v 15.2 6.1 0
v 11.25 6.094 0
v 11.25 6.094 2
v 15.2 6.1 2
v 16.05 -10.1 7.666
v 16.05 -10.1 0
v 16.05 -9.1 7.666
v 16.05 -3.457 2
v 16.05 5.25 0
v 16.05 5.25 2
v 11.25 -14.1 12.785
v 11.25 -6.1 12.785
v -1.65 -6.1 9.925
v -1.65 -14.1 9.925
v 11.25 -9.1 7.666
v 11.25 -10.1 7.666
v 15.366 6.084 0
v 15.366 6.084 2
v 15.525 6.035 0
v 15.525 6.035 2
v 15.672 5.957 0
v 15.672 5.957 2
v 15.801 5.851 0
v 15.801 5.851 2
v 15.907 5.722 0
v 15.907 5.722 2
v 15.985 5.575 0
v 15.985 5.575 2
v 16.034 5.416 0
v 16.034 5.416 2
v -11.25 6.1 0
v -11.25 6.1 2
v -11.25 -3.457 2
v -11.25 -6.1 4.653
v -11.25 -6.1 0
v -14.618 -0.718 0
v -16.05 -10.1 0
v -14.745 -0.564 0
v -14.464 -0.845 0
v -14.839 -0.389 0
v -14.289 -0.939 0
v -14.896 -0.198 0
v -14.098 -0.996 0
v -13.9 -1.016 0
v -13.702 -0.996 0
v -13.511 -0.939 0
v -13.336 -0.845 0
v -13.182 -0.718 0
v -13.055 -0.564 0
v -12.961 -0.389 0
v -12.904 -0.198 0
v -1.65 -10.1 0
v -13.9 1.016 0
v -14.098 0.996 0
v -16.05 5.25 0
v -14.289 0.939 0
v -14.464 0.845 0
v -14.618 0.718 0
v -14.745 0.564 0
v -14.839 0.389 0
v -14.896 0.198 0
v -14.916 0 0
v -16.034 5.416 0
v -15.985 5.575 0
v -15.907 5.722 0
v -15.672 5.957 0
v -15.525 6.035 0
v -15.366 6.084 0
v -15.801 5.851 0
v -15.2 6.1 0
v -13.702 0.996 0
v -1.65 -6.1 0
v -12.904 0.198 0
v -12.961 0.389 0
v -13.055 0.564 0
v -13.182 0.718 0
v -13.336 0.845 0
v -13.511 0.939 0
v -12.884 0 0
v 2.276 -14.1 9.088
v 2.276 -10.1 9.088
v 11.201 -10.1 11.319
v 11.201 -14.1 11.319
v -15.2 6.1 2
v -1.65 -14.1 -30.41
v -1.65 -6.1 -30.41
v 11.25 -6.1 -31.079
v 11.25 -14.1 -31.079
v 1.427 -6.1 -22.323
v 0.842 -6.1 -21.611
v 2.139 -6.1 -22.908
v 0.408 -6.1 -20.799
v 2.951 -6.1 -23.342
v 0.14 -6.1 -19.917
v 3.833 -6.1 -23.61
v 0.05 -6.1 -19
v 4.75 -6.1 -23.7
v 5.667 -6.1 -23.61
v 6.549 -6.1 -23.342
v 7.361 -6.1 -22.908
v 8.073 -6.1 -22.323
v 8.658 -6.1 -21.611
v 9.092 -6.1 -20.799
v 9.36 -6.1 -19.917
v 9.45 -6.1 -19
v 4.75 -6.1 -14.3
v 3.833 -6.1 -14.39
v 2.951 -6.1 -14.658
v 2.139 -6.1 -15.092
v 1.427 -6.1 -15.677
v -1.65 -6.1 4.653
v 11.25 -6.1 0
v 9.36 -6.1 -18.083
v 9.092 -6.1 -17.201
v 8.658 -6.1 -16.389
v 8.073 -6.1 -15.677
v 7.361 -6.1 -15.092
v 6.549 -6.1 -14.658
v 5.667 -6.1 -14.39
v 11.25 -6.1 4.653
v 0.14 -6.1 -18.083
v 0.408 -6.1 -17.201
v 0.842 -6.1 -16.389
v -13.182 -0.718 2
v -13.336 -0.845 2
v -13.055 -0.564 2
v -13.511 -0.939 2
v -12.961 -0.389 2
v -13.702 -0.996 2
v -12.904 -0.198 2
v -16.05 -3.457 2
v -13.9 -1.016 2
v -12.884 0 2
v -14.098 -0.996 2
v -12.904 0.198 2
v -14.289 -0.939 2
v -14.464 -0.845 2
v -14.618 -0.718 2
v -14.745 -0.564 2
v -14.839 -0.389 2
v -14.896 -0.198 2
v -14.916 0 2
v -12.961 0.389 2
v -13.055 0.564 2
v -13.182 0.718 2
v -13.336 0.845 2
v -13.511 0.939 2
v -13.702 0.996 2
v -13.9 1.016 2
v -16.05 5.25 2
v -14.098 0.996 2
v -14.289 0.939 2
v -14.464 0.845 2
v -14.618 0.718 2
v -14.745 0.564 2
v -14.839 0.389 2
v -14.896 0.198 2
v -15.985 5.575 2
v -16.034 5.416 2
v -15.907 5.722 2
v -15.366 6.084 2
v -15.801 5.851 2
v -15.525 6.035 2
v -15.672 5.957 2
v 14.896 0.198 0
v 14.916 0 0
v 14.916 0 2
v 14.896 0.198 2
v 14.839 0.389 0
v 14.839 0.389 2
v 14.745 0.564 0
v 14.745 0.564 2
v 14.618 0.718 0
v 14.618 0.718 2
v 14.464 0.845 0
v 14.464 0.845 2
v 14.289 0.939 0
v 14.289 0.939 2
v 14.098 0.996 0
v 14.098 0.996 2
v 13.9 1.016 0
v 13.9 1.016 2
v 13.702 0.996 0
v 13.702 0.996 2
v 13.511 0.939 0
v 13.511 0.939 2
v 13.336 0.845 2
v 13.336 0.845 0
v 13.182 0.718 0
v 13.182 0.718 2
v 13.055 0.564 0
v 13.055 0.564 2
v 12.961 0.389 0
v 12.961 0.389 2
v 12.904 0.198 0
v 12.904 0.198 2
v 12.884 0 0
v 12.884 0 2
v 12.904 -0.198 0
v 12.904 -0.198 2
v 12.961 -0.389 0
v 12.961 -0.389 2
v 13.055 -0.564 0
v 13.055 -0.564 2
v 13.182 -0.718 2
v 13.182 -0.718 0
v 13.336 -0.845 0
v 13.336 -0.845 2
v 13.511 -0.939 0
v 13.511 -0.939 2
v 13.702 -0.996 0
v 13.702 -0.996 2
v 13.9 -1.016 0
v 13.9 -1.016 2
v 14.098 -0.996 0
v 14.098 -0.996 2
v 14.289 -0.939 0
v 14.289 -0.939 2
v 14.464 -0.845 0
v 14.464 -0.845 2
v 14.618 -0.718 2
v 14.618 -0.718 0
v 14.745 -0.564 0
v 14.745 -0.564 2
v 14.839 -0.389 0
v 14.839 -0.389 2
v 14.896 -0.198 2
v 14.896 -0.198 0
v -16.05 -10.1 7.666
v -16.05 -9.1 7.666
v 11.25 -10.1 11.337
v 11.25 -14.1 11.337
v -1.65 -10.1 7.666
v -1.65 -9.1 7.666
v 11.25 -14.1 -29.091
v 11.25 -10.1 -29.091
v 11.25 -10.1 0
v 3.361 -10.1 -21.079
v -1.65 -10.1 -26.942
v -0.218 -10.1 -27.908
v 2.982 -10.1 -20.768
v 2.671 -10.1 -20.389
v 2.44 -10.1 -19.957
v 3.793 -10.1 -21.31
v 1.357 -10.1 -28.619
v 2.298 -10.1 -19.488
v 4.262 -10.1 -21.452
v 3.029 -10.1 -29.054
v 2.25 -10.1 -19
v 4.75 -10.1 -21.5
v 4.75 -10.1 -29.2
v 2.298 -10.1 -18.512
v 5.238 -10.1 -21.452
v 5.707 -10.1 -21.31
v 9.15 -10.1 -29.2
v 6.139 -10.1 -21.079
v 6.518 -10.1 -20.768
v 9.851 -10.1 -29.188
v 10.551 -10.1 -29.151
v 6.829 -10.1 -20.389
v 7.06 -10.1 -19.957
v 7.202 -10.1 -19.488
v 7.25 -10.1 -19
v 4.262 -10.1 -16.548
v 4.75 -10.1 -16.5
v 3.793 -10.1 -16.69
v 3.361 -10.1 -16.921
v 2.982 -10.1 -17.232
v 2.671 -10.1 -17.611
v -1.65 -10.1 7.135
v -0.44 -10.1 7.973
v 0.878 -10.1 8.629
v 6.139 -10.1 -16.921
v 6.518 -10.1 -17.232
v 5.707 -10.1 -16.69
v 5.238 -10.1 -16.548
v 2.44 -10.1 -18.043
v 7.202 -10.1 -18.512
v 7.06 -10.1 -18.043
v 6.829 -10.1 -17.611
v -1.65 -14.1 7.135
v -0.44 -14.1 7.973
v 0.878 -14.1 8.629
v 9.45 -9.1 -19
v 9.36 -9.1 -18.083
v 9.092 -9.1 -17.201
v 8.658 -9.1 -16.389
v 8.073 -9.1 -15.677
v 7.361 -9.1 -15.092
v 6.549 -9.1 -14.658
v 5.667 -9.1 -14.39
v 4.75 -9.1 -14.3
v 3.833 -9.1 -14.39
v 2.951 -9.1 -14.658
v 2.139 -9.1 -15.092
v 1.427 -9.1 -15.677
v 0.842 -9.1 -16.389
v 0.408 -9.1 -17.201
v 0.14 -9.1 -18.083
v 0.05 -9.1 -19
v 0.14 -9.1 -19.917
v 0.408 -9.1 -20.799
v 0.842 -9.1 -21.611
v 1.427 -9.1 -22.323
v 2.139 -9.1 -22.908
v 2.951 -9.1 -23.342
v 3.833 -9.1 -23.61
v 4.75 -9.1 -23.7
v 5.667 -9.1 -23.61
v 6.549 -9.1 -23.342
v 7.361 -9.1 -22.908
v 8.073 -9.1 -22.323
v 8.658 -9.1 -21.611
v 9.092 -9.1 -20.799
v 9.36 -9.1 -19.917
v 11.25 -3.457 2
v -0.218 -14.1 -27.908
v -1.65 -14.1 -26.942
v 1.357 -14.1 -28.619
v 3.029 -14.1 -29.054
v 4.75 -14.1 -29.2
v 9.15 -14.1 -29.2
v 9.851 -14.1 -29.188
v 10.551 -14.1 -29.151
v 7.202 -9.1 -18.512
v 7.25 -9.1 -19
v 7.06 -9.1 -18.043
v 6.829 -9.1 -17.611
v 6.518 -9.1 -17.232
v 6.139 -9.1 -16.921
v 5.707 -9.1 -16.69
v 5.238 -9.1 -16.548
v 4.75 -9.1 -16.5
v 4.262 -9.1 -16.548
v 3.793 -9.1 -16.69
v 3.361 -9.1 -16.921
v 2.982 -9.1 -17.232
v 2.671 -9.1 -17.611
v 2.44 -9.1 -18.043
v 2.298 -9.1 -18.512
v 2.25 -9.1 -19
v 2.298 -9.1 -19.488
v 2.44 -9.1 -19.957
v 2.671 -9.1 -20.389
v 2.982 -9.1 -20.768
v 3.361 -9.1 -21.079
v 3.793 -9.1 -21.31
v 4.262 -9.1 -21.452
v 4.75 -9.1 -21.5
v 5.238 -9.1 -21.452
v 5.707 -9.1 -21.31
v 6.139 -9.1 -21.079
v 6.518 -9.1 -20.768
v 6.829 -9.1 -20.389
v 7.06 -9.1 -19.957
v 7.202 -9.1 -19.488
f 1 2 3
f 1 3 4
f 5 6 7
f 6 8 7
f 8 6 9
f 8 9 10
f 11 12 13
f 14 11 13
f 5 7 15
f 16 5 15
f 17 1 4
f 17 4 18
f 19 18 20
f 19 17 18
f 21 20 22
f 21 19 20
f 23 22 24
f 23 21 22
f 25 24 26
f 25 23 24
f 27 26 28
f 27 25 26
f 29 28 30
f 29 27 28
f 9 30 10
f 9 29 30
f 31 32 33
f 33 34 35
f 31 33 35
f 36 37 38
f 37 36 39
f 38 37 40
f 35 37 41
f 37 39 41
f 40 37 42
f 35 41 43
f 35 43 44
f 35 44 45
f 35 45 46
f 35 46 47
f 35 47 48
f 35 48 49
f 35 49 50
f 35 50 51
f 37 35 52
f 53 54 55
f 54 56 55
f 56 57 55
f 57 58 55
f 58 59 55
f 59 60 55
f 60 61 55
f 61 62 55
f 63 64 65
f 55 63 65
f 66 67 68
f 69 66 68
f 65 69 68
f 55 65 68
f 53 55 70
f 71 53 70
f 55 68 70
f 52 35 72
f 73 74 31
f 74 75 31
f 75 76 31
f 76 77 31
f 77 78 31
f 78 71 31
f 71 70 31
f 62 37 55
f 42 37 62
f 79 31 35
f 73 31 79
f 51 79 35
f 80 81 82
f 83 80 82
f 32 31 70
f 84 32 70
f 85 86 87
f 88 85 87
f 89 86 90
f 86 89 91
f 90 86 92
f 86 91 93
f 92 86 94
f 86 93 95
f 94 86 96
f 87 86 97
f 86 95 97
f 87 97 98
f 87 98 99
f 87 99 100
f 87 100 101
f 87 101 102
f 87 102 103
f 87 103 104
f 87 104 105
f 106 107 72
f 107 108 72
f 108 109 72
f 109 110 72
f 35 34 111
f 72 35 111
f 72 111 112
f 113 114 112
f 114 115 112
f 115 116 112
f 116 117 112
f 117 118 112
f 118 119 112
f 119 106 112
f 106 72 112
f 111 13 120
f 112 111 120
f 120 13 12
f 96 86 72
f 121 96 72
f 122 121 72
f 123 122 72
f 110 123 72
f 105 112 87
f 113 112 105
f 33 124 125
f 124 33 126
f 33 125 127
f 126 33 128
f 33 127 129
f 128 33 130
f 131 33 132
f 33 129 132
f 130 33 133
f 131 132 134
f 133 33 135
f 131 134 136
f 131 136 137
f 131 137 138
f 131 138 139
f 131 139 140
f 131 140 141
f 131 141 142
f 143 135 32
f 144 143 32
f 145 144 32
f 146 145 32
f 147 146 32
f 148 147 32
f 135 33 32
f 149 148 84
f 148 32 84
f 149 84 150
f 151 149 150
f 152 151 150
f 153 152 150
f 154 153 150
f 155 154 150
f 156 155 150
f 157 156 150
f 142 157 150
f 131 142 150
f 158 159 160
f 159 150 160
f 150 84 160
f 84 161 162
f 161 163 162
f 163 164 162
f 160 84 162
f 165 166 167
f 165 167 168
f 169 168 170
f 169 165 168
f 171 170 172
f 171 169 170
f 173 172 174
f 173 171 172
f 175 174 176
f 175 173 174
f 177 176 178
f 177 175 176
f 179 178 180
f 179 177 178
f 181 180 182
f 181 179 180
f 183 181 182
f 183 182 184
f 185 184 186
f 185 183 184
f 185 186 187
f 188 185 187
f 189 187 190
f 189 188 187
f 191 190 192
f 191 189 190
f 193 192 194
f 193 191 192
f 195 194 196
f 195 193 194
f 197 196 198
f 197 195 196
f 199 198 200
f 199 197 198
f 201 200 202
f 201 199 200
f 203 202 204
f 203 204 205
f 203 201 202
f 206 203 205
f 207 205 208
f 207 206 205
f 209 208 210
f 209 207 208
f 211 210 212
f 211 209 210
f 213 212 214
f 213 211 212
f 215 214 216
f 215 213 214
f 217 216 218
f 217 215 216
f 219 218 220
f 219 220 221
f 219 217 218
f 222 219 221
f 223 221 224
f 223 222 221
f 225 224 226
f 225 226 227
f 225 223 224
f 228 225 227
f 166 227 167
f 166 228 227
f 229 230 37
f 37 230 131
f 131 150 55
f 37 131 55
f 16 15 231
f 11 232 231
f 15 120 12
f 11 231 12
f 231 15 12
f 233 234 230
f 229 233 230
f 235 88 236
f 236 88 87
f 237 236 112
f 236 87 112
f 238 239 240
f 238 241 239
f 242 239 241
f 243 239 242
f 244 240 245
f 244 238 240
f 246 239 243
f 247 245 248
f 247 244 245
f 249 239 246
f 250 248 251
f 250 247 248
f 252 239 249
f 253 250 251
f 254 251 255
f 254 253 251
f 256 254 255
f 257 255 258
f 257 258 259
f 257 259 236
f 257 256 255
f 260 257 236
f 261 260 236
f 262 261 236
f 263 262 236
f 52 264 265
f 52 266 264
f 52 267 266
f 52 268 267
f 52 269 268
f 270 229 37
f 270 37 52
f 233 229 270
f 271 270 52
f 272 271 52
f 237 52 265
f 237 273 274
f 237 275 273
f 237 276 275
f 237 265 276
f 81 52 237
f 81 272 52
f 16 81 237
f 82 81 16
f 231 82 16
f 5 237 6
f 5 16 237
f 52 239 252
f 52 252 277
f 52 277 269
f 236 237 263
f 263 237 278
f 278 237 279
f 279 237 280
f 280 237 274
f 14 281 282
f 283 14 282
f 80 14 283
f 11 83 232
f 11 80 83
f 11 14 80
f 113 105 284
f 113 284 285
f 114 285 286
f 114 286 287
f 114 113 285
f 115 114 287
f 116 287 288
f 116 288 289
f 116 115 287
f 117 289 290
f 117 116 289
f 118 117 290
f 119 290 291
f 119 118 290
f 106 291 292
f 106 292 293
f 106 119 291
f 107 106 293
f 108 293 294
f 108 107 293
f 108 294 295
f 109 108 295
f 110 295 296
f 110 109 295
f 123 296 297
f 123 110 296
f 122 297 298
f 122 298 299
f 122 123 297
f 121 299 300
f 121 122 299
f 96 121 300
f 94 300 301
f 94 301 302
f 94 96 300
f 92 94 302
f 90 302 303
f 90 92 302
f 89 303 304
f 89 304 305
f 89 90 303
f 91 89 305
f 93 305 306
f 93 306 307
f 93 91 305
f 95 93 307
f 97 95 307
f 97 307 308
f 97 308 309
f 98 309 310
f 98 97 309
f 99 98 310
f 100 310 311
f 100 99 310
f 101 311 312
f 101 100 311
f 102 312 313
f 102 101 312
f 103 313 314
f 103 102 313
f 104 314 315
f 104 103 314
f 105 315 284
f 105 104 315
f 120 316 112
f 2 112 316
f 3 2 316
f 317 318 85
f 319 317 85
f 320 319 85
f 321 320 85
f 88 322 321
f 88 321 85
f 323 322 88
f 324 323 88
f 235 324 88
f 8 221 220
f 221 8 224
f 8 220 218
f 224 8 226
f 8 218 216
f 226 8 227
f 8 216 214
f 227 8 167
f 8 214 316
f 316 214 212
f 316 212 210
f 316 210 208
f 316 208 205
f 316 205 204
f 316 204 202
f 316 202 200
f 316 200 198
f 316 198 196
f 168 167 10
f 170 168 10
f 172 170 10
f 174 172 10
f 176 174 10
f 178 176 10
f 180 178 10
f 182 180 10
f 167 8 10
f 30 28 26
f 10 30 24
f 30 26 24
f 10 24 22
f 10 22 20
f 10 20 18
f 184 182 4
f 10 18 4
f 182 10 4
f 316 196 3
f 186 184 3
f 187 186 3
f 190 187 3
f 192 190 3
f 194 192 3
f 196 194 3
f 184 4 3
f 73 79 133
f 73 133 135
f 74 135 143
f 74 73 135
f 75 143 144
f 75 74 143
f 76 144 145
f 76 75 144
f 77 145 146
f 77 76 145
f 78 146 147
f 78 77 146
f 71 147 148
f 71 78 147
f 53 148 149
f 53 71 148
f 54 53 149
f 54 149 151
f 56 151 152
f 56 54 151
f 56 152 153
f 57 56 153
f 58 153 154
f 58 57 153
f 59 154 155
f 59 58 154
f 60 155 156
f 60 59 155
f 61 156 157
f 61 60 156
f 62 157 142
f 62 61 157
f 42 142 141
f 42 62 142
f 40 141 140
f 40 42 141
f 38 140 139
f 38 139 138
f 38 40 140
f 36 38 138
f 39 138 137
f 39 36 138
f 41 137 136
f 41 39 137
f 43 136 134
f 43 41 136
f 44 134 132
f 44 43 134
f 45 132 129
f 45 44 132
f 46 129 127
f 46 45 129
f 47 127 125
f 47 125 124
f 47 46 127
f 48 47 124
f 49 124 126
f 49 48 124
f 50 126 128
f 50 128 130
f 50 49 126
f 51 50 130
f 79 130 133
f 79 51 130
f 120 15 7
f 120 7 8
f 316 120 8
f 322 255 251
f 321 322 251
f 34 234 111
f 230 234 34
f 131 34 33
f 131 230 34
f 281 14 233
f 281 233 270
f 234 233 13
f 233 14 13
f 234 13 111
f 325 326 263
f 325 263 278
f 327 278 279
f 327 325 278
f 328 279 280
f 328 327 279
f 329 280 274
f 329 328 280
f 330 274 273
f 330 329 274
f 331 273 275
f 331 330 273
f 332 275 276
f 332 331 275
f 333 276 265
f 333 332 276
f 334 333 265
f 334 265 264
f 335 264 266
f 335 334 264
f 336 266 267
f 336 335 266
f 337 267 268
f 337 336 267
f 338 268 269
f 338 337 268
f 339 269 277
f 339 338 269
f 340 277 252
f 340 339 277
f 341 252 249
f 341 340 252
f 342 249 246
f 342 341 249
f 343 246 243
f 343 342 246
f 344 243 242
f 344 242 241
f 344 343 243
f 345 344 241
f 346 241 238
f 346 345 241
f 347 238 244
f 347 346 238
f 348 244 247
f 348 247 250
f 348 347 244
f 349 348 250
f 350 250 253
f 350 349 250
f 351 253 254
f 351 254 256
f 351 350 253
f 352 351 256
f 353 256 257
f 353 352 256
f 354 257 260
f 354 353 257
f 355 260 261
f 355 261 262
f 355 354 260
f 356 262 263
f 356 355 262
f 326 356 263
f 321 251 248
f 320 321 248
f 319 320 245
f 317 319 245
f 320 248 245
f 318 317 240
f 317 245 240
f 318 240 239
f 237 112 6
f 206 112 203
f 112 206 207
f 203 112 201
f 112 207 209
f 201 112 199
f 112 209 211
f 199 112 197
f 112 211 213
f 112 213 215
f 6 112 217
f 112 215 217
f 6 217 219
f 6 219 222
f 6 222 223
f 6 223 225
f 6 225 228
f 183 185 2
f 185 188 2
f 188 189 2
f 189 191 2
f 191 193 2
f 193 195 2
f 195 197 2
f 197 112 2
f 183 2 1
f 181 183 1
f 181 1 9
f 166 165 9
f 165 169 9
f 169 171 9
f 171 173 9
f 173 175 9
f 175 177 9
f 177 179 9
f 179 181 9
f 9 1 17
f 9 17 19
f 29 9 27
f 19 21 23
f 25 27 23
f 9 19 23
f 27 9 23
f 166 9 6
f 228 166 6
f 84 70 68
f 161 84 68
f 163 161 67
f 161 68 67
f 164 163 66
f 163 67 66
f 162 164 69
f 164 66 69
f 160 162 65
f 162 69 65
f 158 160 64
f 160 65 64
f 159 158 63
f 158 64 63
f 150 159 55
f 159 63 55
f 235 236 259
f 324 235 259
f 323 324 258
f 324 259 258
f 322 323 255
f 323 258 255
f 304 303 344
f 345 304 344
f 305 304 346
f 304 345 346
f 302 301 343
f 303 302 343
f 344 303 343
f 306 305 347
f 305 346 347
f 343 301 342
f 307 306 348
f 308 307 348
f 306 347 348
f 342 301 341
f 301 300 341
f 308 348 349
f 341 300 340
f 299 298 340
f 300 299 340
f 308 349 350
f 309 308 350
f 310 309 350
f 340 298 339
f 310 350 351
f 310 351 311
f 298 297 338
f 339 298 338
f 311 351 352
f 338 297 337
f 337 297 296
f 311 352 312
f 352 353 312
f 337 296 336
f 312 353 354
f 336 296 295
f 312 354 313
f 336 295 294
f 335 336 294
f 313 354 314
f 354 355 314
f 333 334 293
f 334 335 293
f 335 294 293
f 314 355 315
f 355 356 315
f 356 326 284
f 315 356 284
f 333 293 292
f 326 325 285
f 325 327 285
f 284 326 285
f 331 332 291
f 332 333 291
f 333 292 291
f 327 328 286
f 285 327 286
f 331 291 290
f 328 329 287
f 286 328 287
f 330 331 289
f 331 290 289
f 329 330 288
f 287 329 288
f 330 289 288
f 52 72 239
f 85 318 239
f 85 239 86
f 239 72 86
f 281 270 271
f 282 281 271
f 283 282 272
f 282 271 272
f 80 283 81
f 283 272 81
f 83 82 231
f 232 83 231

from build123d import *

# Parameters (mm, degrees)
SKETCH1_R                       = 1.016
BOSS_EXTRUDE1_DEPTH             = 2
SKETCH2_R                       = 4.7
BOSS_EXTRUDE2_DEPTH             = 3
BOSS_EXTRUDE5_DEPTH             = 8
BOSS_EXTRUDE6_REACH             = 45.704
BOSS_EXTRUDE6_DIRECTION_2_REACH = 45.704
SKETCH4_W                       = 22.5
SKETCH4_H                       = 14.127681706
CUT_EXTRUDE1_DEPTH              = 7
SKETCH5_R                       = 2.5
BOSS_EXTRUDE7_DEPTH             = 1


with BuildPart() as part:
    # Sketch1 → Boss-Extrude1 (new body)
    # profile 1 of 4: a face of its own
    with BuildSketch(Plane.XY):
        with BuildLine():
            Line((-16.05, 5.25), (-16.05, -5.25))
            ThreePointArc((-16.05, -5.25), (-15.801040764, -5.851040764), (-15.2, -6.1))
            Line((-15.2, -6.1), (-11.25, -6.1))
            Line((-11.25, -6.1), (-11.25, 6.1))
            Line((-11.25, 6.1), (-15.2, 6.1))
            ThreePointArc((-15.2, 6.1), (-15.801040764, 5.851040764), (-16.05, 5.25))
        make_face()
        with Locations((-13.9, 0)):
            Circle(SKETCH1_R, mode=Mode.SUBTRACT)
    # profile 2 of 4: a face of its own
    with BuildSketch(Plane.XY):
        with BuildLine():
            Line((16.05, 5.25), (16.05, -5.25))
            ThreePointArc((16.05, -5.25), (15.801040764, -5.851040764), (15.2, -6.1))
            Line((15.2, -6.1), (11.25, -6.1))
            Line((11.25, -6.1), (11.25, 6.094097151))
            Line((11.25, 6.094097151), (15.2, 6.1))
            ThreePointArc((15.2, 6.1), (15.801040764, 5.851040764), (16.05, 5.25))
        make_face()
        with Locations((13.9, 0)):
            Circle(SKETCH1_R, mode=Mode.SUBTRACT)
    # profile 3 of 4: a face of its own
    with BuildSketch(Plane.XY):
        with BuildLine():
            ThreePointArc((15.2, -6.1), (15.801040764, -5.851040764), (16.05, -5.25))
            Line((16.05, -5.25), (16.05, -6.1))
            Line((16.05, -6.1), (15.2, -6.1))
        make_face()
    # profile 4 of 4: a face of its own
    with BuildSketch(Plane.XY):
        with BuildLine():
            ThreePointArc((-16.05, -5.25), (-15.801040764, -5.851040764), (-15.2, -6.1))
            Line((-15.2, -6.1), (-16.05, -6.1))
            Line((-16.05, -6.1), (-16.05, -5.25))
        make_face()
    extrude(amount=BOSS_EXTRUDE1_DEPTH)

    # Sketch2 → Boss-Extrude2 (add)
    with BuildSketch(Plane.XZ.offset(6.1)):
        Polygon((16.05, 2), (11.25, 2), (11.25, 12.784507897), (-1.65, 9.925449639), (-1.65, 2), (-16.05, 2), (-16.05, 0), (-1.65, 0), (-1.65, -30.41033757), (11.25, -31.079190458), (11.25, 0), (16.05, 0), align=None)
        with Locations((4.75, -19)):
            Circle(SKETCH2_R, mode=Mode.SUBTRACT)
    extrude(amount=BOSS_EXTRUDE2_DEPTH)

    # Sketch2<3> → Boss-Extrude5 (add)
    with BuildSketch(Plane.XZ.offset(6.1)):
        with BuildLine():
            Line((11.201492875, 11.3190285), (11.25, 11.337476622))
            Line((11.25, 11.337476622), (11.25, 12.784507897))
            Line((11.25, 12.784507897), (-1.65, 9.925449639))
            Line((-1.65, 9.925449639), (-1.65, 7.134527797))
            ThreePointArc((-1.65, 7.134527797), (0.2068653, 8.32459199), (2.276136625, 9.087689437))
            Line((2.276136625, 9.087689437), (11.201492875, 11.3190285))
        make_face()
        with BuildLine():
            ThreePointArc((4.75, -29.2), (1.356725547, -28.619027419), (-1.65, -26.942291861))
            Line((-1.65, -26.942291861), (-1.65, -30.41033757))
            Line((-1.65, -30.41033757), (11.25, -31.079190458))
            Line((11.25, -31.079190458), (11.25, -29.090542554))
            ThreePointArc((11.25, -29.090542554), (10.201413429, -29.172617079), (9.149976222, -29.2))
            Line((9.149976222, -29.2), (4.75, -29.2))
        make_face()
    extrude(amount=BOSS_EXTRUDE5_DEPTH)

    # Boss-Extrude6: up to this face of the body (flat: up to its plane)
    boss_extrude6_end = Plane(part.part.faces().sort_by_distance((16.05, -1.925, 1))[0])
    # Sketch3 → Boss-Extrude6 (add, up to the picked face)
    with BuildSketch(Plane(origin=(11.25, 0, 0), x_dir=(0, 0, -1), z_dir=(1, 0, 0)), mode=Mode.PRIVATE) as boss_extrude6_sk1:
        Polygon((-7.665828596, -9.1), (-2, -3.457464127), (-2, -9.1), align=None)
    boss_extrude6_tool1 = split(extrude(boss_extrude6_sk1.sketch, amount=BOSS_EXTRUDE6_REACH, mode=Mode.PRIVATE), bisect_by=boss_extrude6_end, keep=Keep.BOTH, mode=Mode.PRIVATE)
    add(boss_extrude6_tool1.solids().sort_by(Axis((11.25, -7.219155, 3.88861), (1, 0, 0)))[0])

    # Boss-Extrude6 direction 2: up to this face of the body (flat: up to its plane)
    boss_extrude6_direction_2_end = Plane(part.part.faces().sort_by_distance((-16.05, -1.925, 1))[0])
    # Sketch3 → Boss-Extrude6 direction 2 (add, up to the picked face)
    with BuildSketch(Plane(origin=(11.25, 0, 0), x_dir=(0, 0, -1), z_dir=(1, 0, 0)), mode=Mode.PRIVATE) as boss_extrude6_direction_2_sk1:
        Polygon((-7.665828596, -9.1), (-2, -3.457464127), (-2, -9.1), align=None)
    boss_extrude6_direction_2_tool1 = split(extrude(boss_extrude6_direction_2_sk1.sketch, amount=-BOSS_EXTRUDE6_DIRECTION_2_REACH, mode=Mode.PRIVATE), bisect_by=boss_extrude6_direction_2_end, keep=Keep.BOTH, mode=Mode.PRIVATE)
    add(boss_extrude6_direction_2_tool1.solids().sort_by(Axis((11.25, -7.219155, 3.88861), (-1, 0, 0)))[0])

    # Sketch4 → Cut-Extrude1 (cut)
    with BuildSketch(Plane(origin=(0, -6.1, 0), x_dir=(1, 0, 0), z_dir=(0, 1, 0))):
        with Locations((0, -7.063840853)):
            Rectangle(SKETCH4_W, SKETCH4_H)
    extrude(amount=CUT_EXTRUDE1_DEPTH, mode=Mode.SUBTRACT)

    # Sketch5 → Boss-Extrude7 (add)
    with BuildSketch(Plane.XZ.offset(9.1)):
        with BuildLine():
            Line((-1.65, 0), (-1.65, -26.942291861))
            ThreePointArc((-1.65, -26.942291861), (1.356725547, -28.619027419), (4.75, -29.2))
            Line((4.75, -29.2), (9.149976222, -29.2))
            ThreePointArc((9.149976222, -29.2), (10.201413429, -29.172617079), (11.25, -29.090542554))
            Line((11.25, -29.090542554), (11.25, 0))
            Line((11.25, 0), (16.05, 0))
            Line((16.05, 0), (16.05, 7.665828596))
            Line((16.05, 7.665828596), (11.25, 7.665828596))
            Line((11.25, 7.665828596), (11.25, 11.337476622))
            Line((11.25, 11.337476622), (11.201492875, 11.3190285))
            Line((11.201492875, 11.3190285), (2.276136625, 9.087689437))
            ThreePointArc((2.276136625, 9.087689437), (0.2068653, 8.32459199), (-1.65, 7.134527797))
            Line((-1.65, 7.134527797), (-1.65, 7.665828596))
            Line((-1.65, 7.665828596), (-16.05, 7.665828596))
            Line((-16.05, 7.665828596), (-16.05, 0))
            Line((-16.05, 0), (-1.65, 0))
        make_face()
        with Locations((4.75, -19)):
            Circle(SKETCH5_R, mode=Mode.SUBTRACT)
    extrude(amount=BOSS_EXTRUDE7_DEPTH)


solid = part.part
